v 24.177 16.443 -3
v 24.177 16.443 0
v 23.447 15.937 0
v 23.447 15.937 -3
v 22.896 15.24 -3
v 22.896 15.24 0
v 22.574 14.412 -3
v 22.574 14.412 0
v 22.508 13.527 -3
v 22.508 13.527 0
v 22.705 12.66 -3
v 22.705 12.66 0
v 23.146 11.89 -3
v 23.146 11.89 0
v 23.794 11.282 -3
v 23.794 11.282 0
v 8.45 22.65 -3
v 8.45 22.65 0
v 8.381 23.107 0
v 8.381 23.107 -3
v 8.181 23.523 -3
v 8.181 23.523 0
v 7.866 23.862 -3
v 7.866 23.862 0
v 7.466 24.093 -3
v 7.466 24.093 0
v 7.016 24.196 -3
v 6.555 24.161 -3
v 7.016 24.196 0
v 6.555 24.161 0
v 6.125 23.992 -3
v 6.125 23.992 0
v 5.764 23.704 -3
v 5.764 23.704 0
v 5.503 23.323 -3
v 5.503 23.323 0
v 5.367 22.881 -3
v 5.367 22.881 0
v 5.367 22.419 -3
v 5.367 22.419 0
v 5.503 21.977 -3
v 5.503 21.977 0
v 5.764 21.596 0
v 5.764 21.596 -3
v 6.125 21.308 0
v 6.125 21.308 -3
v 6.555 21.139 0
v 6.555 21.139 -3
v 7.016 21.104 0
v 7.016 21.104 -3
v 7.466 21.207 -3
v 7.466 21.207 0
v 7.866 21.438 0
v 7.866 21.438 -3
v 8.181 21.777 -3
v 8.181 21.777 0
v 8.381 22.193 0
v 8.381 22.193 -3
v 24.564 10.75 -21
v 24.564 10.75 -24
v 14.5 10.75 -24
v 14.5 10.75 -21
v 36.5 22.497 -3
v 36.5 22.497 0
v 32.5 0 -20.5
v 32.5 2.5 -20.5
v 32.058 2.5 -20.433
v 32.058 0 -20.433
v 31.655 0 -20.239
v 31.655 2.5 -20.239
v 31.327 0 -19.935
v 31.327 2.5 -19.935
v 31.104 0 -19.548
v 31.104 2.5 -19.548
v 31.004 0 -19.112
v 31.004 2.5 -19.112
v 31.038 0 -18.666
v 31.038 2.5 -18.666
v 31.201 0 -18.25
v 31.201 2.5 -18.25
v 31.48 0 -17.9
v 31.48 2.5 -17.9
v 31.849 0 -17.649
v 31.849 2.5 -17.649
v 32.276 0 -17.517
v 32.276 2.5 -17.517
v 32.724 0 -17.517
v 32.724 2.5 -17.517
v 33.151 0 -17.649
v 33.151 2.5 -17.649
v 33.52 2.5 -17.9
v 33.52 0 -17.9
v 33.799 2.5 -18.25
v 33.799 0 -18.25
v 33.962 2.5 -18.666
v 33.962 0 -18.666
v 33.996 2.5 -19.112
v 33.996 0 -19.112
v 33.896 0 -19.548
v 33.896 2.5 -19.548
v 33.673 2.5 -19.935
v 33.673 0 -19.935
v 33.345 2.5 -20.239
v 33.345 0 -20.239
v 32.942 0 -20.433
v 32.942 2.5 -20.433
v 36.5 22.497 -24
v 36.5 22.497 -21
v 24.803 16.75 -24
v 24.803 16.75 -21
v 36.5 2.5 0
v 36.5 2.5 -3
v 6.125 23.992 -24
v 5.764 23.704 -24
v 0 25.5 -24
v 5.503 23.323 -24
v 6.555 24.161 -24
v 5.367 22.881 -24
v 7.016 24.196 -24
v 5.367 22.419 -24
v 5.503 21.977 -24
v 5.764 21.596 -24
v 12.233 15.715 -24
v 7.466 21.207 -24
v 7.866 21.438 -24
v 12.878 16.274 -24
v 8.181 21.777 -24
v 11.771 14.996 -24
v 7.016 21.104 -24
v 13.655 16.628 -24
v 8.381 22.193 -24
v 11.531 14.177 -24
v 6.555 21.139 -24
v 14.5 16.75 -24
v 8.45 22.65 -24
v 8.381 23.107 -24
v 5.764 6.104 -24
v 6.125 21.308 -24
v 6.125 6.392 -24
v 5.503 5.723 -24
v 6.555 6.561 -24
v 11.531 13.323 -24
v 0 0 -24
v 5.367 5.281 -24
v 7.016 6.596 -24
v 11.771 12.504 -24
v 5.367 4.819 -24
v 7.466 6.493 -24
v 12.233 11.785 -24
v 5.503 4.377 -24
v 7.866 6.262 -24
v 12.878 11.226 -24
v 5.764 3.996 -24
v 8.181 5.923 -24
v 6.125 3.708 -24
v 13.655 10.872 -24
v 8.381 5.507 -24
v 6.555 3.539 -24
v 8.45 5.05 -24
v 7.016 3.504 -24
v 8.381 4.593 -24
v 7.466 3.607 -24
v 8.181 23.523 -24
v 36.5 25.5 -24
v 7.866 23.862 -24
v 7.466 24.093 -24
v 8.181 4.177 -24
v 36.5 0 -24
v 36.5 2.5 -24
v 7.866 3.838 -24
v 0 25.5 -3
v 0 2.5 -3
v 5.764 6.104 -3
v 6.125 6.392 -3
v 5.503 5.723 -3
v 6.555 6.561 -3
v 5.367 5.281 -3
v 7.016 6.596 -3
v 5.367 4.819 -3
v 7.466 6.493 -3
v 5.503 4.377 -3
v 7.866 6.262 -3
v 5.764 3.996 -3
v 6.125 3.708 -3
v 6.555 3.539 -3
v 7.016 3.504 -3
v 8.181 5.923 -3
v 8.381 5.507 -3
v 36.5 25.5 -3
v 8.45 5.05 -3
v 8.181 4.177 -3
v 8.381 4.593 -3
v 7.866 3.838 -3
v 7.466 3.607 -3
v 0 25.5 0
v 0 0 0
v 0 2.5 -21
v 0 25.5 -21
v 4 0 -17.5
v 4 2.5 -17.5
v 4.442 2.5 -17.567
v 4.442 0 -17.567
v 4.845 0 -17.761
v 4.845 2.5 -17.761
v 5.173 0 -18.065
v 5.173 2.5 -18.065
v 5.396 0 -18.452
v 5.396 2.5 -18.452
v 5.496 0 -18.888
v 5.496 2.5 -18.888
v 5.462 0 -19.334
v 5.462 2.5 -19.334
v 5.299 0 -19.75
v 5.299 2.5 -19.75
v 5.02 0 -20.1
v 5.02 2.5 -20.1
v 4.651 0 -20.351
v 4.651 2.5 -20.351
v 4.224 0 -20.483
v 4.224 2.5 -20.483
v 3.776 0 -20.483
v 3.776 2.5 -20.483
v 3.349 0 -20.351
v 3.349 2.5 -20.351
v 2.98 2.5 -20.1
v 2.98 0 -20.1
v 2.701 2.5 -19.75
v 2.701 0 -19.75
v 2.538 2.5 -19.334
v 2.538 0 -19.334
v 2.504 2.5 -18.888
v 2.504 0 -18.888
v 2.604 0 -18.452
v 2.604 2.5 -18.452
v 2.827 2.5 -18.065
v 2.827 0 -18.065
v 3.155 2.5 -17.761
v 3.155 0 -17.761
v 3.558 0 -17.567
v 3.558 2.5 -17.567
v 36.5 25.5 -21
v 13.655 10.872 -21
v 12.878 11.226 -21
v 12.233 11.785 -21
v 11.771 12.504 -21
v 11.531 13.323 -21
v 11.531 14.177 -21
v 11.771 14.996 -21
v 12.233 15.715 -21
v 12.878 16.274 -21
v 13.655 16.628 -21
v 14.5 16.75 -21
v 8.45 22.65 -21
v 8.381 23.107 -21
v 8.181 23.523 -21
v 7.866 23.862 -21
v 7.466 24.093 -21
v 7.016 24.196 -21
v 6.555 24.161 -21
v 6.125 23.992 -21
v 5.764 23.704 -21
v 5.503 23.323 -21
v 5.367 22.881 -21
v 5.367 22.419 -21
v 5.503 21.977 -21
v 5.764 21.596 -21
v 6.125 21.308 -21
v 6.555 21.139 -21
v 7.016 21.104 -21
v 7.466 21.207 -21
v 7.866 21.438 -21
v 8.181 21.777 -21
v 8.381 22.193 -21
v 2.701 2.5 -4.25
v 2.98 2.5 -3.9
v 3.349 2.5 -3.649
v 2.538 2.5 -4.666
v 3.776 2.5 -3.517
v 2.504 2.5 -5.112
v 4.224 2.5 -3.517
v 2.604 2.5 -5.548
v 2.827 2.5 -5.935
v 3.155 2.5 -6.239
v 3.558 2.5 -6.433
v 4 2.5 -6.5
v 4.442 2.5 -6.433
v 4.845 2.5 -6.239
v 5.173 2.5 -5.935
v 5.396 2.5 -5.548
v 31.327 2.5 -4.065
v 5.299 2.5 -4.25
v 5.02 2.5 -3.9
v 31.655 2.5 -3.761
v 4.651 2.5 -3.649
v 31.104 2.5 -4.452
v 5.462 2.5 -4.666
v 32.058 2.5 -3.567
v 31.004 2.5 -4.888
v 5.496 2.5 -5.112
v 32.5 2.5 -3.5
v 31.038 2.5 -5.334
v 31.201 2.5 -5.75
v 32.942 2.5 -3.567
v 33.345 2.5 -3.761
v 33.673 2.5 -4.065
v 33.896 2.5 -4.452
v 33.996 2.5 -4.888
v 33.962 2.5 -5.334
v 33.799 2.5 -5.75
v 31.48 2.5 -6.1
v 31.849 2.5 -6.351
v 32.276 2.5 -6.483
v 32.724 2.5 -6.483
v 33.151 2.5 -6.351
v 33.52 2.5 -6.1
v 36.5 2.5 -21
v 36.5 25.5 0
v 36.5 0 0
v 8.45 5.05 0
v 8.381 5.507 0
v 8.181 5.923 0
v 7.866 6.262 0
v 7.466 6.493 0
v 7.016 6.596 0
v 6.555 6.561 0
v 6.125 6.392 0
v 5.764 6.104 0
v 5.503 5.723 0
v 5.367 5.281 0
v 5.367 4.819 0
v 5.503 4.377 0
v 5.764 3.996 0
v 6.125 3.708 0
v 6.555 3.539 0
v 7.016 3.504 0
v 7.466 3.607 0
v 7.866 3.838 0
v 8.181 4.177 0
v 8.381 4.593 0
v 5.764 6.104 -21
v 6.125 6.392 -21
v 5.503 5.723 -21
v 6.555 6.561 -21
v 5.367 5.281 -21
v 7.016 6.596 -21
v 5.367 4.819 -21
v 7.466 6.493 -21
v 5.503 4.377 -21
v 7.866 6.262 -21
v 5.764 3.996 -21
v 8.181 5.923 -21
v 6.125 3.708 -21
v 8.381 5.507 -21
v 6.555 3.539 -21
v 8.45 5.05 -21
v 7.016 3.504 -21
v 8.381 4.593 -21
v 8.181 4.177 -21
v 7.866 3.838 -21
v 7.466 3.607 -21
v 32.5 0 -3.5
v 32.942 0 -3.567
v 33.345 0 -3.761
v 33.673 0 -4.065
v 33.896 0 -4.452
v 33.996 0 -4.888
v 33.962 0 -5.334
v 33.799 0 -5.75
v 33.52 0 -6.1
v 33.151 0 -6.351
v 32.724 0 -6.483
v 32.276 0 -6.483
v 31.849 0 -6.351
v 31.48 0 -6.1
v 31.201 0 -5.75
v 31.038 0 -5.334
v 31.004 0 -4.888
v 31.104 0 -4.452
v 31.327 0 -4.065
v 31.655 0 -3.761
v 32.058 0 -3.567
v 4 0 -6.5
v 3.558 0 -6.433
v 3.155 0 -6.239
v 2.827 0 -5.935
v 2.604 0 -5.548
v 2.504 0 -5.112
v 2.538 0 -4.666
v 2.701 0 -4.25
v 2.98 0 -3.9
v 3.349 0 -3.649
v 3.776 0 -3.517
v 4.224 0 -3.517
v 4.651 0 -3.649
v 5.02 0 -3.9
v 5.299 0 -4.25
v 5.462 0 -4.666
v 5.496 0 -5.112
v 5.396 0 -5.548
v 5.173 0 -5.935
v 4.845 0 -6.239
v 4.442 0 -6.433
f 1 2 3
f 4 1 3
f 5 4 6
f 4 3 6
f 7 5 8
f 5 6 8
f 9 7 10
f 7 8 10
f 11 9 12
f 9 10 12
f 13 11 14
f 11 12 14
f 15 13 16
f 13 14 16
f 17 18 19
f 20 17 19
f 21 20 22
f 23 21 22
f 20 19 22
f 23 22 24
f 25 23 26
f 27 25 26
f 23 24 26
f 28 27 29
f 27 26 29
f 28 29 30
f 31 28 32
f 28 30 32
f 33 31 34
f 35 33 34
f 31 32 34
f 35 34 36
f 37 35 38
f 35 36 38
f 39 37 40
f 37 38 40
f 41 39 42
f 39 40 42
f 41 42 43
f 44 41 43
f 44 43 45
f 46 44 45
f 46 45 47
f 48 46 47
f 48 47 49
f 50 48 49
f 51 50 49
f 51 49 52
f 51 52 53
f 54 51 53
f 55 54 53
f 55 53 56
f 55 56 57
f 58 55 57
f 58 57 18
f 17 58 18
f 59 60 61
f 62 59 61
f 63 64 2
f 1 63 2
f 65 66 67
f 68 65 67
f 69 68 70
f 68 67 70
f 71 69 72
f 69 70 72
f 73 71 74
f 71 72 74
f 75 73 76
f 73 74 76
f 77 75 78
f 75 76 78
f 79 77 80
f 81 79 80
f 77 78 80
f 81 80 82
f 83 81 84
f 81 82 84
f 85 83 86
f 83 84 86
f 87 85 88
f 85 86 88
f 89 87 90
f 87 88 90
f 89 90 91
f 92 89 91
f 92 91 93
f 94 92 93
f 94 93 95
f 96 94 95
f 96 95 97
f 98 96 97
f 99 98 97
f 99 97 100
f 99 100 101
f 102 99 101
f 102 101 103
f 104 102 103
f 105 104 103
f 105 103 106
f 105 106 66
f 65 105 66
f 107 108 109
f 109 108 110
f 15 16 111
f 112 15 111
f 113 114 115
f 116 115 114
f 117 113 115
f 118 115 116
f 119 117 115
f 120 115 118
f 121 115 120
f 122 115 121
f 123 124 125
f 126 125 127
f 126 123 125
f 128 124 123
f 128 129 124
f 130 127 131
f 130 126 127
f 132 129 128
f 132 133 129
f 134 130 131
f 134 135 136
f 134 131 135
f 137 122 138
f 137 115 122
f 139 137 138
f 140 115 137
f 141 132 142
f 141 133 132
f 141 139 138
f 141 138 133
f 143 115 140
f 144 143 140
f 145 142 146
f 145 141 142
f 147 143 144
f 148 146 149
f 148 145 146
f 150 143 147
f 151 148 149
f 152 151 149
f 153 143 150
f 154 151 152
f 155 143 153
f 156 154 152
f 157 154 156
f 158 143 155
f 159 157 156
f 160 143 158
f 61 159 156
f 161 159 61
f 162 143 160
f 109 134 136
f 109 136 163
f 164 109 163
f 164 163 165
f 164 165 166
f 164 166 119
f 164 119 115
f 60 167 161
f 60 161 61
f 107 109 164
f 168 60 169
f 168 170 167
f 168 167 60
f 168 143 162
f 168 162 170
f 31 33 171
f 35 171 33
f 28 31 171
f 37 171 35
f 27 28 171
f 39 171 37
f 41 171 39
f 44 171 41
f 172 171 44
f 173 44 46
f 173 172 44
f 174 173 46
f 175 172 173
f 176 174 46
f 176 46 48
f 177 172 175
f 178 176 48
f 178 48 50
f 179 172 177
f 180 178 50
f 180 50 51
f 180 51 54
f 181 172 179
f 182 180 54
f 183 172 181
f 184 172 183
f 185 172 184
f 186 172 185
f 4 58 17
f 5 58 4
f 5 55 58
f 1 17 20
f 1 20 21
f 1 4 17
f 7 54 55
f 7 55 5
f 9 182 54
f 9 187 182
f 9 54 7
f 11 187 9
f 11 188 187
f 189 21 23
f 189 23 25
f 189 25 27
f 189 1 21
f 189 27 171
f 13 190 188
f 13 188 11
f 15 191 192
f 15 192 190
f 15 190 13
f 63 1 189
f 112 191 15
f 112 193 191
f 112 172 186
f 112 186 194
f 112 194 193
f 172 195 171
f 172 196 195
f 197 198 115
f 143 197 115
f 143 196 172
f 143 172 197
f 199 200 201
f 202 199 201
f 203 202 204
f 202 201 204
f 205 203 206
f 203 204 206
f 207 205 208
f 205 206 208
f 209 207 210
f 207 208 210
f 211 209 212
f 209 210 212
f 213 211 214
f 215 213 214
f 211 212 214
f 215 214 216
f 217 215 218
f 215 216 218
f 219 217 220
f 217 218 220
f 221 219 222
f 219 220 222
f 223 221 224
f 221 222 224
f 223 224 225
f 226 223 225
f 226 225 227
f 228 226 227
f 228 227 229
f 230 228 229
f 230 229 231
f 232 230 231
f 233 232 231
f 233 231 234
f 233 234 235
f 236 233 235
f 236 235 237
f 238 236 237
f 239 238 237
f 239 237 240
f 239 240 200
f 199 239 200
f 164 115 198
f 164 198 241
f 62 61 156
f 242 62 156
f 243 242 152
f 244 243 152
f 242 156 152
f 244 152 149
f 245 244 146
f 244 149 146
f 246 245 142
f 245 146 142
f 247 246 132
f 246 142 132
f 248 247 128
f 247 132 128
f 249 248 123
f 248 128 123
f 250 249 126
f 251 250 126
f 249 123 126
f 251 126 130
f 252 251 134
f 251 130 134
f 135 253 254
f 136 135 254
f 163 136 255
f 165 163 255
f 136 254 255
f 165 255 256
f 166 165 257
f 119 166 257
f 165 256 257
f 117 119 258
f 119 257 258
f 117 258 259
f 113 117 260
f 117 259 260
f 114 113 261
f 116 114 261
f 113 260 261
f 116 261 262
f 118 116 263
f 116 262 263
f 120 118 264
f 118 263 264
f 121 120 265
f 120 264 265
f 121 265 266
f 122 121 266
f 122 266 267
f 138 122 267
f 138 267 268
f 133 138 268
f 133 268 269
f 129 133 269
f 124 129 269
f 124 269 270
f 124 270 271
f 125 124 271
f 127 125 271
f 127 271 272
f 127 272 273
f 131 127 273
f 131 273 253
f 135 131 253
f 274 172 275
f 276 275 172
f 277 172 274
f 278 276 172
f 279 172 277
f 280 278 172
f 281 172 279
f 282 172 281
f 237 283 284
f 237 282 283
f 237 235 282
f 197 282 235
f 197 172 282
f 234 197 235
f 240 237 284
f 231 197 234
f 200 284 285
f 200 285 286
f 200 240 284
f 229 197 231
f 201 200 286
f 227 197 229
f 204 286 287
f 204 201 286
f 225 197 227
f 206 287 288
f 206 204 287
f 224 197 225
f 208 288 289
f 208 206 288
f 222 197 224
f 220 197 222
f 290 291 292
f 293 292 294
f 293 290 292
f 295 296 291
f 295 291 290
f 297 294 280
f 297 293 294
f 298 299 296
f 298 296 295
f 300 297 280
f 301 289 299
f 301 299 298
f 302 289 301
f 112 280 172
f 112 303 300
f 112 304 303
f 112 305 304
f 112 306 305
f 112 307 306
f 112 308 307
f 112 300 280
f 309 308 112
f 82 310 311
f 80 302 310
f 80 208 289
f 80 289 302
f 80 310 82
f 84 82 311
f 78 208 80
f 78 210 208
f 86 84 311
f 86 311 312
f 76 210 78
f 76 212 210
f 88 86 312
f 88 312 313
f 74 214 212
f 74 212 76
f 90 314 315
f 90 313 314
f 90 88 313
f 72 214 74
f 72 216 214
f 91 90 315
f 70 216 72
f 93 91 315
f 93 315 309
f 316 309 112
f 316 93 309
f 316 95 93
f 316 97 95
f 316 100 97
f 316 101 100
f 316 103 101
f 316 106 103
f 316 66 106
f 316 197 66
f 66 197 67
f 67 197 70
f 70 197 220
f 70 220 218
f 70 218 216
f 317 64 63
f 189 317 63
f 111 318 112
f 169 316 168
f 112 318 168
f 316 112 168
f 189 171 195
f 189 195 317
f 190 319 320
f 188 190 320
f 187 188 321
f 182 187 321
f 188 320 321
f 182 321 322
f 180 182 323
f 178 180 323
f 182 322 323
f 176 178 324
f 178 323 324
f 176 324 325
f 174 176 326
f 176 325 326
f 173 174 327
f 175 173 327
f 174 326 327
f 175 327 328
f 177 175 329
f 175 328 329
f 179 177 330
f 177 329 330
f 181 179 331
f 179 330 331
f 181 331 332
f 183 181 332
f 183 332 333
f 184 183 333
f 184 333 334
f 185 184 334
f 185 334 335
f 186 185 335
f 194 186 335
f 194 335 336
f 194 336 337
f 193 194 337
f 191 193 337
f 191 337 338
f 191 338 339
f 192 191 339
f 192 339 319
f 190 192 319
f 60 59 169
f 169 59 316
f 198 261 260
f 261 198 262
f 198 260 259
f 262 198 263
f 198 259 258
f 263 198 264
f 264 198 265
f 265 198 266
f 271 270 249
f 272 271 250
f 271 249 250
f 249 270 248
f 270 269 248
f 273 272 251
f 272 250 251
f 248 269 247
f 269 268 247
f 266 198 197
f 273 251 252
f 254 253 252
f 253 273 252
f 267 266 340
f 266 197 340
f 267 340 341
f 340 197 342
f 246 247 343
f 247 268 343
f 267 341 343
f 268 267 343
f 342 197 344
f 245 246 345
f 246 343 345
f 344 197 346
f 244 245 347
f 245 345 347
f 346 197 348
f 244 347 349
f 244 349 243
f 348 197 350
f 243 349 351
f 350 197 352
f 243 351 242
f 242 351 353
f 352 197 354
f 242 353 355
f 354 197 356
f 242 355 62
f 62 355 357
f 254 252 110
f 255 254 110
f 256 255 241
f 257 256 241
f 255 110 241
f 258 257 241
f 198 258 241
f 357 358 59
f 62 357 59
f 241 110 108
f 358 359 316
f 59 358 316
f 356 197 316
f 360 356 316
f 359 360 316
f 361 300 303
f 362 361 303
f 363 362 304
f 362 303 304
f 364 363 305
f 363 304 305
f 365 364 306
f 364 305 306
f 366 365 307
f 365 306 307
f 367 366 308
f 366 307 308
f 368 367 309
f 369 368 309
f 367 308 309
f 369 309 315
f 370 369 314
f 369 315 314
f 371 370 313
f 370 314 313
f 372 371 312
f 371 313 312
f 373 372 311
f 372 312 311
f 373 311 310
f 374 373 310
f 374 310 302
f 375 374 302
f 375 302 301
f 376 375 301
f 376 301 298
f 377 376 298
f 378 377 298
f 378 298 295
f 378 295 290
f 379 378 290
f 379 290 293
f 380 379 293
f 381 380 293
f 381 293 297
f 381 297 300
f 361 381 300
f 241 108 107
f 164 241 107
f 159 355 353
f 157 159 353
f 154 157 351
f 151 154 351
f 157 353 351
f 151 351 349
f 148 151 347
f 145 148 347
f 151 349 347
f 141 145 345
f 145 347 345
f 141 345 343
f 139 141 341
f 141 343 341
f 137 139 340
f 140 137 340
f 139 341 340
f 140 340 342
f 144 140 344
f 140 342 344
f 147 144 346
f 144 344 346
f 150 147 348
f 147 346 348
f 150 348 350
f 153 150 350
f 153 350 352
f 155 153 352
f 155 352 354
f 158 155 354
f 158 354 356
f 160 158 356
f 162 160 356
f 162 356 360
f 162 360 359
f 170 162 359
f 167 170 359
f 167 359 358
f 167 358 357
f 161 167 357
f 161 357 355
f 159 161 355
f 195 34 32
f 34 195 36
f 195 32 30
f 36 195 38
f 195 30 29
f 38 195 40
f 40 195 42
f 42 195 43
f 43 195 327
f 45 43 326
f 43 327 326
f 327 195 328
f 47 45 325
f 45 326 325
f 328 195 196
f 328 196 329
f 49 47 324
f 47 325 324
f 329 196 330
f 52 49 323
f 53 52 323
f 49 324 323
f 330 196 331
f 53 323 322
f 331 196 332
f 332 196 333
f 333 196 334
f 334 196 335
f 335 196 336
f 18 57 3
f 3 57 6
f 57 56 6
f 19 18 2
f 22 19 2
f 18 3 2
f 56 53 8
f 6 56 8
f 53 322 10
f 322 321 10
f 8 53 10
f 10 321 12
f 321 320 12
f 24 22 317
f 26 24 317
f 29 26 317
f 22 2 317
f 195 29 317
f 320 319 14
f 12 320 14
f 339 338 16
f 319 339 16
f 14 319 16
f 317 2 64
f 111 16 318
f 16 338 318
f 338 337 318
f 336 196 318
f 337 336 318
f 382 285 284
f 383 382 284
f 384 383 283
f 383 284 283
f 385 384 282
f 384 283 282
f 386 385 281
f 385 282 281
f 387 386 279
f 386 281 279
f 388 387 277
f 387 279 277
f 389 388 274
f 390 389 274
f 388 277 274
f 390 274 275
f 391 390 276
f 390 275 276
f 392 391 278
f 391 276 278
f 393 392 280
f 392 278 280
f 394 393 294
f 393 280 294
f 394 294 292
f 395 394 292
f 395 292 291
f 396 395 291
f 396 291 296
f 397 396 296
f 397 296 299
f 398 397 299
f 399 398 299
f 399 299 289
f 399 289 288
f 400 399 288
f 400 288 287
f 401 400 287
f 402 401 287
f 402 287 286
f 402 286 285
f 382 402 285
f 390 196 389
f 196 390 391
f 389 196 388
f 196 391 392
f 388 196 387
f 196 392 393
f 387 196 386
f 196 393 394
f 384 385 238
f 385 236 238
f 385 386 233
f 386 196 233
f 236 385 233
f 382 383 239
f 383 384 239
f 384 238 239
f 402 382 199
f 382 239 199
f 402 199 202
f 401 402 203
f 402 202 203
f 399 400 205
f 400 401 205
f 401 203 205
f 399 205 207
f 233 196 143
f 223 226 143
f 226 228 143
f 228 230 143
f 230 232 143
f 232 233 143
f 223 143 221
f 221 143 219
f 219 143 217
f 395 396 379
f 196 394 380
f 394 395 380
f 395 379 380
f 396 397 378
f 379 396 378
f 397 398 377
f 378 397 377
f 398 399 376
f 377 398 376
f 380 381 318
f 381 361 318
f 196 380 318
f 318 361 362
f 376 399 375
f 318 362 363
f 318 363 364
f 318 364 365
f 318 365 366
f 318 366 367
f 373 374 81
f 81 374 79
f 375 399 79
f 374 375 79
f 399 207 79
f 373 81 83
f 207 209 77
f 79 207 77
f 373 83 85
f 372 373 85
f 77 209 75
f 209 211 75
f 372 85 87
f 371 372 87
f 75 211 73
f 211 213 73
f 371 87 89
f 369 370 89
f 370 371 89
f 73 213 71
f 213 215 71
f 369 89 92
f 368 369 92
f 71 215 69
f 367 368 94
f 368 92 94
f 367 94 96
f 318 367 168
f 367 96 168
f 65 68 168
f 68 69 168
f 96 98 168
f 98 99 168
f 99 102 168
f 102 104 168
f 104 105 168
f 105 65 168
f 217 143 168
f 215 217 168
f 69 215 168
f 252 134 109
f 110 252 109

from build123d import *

# Parameters (mm, degrees)
SKETCH1_W           = 36.5
SKETCH1_H           = 24
BOSS_EXTRUDE1_DEPTH = 2.5
SKETCH2_W           = 36.5
SKETCH2_H           = 3
BOSS_EXTRUDE2_DEPTH = 23
SKETCH3_R           = 3
SKETCH3_R_2         = 1.55
CUT_EXTRUDE2_DEPTH  = 51.581617214
SKETCH6_R           = 1.5
CUT_EXTRUDE4_DEPTH  = 50.368512232
CUT_EXTRUDE5_REACH  = 52.582


with BuildPart() as part:
    # Sketch1 → Boss-Extrude1 (new body)
    with BuildSketch(Plane(origin=(0, 0, 0), x_dir=(1, 0, 0), z_dir=(0, 1, 0))):
        with Locations((18.25, 12)):
            Rectangle(SKETCH1_W, SKETCH1_H)
    extrude(amount=BOSS_EXTRUDE1_DEPTH)

    # Sketch2 → Boss-Extrude2 (add)
    with BuildSketch(Plane(origin=(0, 2.5, 0), x_dir=(1, 0, 0), z_dir=(0, 1, 0))):
        with Locations((18.25, 1.5)):
            Rectangle(SKETCH2_W, SKETCH2_H)
        with Locations((18.25, 22.5)):
            Rectangle(SKETCH2_W, SKETCH2_H)
    extrude(amount=BOSS_EXTRUDE2_DEPTH)

    # Sketch3 → Cut-Extrude2 (cut, through all)
    with BuildSketch(Plane.XY):
        with Locations((25.5, 13.75)):
            Circle(SKETCH3_R)
        with BuildLine():
            Line((36.5, 2.5), (36.5, 22.497165255))
            Line((36.5, 22.497165255), (24.17707002, 16.442555713))
            ThreePointArc((24.17707002, 16.442555713), (27.086065897, 16.29644752), (28.5, 13.75))
            ThreePointArc((28.5, 13.75), (26.893321833, 11.093187197), (23.794230487, 11.282136477))
            Line((23.794230487, 11.282136477), (36.5, 2.5))
        make_face()
        with Locations((6.9, 22.65)):
            Circle(SKETCH3_R_2)
        with Locations((6.9, 5.05)):
            Circle(SKETCH3_R_2)
    extrude(amount=-CUT_EXTRUDE2_DEPTH, mode=Mode.SUBTRACT)

    # Sketch6 → Cut-Extrude4 (cut, through all)
    with BuildSketch(Plane(origin=(0, 2.5, 0), x_dir=(1, 0, 0), z_dir=(0, 1, 0))):
        with Locations(Location((4, 19, 0), (0, 0, 270))):
            Circle(SKETCH6_R)
        with Locations(Location((32.5, 19, 0), (0, 0, 90))):
            Circle(SKETCH6_R)
        with Locations(Location((32.5, 5, 0), (0, 0, 270))):
            Circle(SKETCH6_R)
        with Locations(Location((4, 5, 0), (0, 0, 90))):
            Circle(SKETCH6_R)
    extrude(amount=-CUT_EXTRUDE4_DEPTH, mode=Mode.SUBTRACT)

    # Sketch8 → Cut-Extrude5 (cut, up to next)
    with BuildSketch(Plane(origin=(0, 0, -24), x_dir=(-1, 0, 0), z_dir=(0, 0, -1)), mode=Mode.PRIVATE) as cut_extrude5_sk1:
        with BuildLine():
            Line((-24.564111876, 10.75), (-14.5, 10.75))
            ThreePointArc((-14.5, 10.75), (-11.5, 13.75), (-14.5, 16.75))
            Line((-14.5, 16.75), (-24.802810523, 16.75))
            Line((-24.802810523, 16.75), (-24.17707002, 16.442555713))
            ThreePointArc((-24.17707002, 16.442555713), (-22.508221795, 13.971953085), (-23.794230487, 11.282136477))
            Line((-23.794230487, 11.282136477), (-24.564111876, 10.75))
        make_face()
    cut_extrude5_tool1 = extrude(cut_extrude5_sk1.sketch, amount=-CUT_EXTRUDE5_REACH, mode=Mode.PRIVATE) & part.part
    add(cut_extrude5_tool1.solids().sort_by_distance((17.630744, 13.752153, -24))[0], mode=Mode.SUBTRACT)


solid = part.part
